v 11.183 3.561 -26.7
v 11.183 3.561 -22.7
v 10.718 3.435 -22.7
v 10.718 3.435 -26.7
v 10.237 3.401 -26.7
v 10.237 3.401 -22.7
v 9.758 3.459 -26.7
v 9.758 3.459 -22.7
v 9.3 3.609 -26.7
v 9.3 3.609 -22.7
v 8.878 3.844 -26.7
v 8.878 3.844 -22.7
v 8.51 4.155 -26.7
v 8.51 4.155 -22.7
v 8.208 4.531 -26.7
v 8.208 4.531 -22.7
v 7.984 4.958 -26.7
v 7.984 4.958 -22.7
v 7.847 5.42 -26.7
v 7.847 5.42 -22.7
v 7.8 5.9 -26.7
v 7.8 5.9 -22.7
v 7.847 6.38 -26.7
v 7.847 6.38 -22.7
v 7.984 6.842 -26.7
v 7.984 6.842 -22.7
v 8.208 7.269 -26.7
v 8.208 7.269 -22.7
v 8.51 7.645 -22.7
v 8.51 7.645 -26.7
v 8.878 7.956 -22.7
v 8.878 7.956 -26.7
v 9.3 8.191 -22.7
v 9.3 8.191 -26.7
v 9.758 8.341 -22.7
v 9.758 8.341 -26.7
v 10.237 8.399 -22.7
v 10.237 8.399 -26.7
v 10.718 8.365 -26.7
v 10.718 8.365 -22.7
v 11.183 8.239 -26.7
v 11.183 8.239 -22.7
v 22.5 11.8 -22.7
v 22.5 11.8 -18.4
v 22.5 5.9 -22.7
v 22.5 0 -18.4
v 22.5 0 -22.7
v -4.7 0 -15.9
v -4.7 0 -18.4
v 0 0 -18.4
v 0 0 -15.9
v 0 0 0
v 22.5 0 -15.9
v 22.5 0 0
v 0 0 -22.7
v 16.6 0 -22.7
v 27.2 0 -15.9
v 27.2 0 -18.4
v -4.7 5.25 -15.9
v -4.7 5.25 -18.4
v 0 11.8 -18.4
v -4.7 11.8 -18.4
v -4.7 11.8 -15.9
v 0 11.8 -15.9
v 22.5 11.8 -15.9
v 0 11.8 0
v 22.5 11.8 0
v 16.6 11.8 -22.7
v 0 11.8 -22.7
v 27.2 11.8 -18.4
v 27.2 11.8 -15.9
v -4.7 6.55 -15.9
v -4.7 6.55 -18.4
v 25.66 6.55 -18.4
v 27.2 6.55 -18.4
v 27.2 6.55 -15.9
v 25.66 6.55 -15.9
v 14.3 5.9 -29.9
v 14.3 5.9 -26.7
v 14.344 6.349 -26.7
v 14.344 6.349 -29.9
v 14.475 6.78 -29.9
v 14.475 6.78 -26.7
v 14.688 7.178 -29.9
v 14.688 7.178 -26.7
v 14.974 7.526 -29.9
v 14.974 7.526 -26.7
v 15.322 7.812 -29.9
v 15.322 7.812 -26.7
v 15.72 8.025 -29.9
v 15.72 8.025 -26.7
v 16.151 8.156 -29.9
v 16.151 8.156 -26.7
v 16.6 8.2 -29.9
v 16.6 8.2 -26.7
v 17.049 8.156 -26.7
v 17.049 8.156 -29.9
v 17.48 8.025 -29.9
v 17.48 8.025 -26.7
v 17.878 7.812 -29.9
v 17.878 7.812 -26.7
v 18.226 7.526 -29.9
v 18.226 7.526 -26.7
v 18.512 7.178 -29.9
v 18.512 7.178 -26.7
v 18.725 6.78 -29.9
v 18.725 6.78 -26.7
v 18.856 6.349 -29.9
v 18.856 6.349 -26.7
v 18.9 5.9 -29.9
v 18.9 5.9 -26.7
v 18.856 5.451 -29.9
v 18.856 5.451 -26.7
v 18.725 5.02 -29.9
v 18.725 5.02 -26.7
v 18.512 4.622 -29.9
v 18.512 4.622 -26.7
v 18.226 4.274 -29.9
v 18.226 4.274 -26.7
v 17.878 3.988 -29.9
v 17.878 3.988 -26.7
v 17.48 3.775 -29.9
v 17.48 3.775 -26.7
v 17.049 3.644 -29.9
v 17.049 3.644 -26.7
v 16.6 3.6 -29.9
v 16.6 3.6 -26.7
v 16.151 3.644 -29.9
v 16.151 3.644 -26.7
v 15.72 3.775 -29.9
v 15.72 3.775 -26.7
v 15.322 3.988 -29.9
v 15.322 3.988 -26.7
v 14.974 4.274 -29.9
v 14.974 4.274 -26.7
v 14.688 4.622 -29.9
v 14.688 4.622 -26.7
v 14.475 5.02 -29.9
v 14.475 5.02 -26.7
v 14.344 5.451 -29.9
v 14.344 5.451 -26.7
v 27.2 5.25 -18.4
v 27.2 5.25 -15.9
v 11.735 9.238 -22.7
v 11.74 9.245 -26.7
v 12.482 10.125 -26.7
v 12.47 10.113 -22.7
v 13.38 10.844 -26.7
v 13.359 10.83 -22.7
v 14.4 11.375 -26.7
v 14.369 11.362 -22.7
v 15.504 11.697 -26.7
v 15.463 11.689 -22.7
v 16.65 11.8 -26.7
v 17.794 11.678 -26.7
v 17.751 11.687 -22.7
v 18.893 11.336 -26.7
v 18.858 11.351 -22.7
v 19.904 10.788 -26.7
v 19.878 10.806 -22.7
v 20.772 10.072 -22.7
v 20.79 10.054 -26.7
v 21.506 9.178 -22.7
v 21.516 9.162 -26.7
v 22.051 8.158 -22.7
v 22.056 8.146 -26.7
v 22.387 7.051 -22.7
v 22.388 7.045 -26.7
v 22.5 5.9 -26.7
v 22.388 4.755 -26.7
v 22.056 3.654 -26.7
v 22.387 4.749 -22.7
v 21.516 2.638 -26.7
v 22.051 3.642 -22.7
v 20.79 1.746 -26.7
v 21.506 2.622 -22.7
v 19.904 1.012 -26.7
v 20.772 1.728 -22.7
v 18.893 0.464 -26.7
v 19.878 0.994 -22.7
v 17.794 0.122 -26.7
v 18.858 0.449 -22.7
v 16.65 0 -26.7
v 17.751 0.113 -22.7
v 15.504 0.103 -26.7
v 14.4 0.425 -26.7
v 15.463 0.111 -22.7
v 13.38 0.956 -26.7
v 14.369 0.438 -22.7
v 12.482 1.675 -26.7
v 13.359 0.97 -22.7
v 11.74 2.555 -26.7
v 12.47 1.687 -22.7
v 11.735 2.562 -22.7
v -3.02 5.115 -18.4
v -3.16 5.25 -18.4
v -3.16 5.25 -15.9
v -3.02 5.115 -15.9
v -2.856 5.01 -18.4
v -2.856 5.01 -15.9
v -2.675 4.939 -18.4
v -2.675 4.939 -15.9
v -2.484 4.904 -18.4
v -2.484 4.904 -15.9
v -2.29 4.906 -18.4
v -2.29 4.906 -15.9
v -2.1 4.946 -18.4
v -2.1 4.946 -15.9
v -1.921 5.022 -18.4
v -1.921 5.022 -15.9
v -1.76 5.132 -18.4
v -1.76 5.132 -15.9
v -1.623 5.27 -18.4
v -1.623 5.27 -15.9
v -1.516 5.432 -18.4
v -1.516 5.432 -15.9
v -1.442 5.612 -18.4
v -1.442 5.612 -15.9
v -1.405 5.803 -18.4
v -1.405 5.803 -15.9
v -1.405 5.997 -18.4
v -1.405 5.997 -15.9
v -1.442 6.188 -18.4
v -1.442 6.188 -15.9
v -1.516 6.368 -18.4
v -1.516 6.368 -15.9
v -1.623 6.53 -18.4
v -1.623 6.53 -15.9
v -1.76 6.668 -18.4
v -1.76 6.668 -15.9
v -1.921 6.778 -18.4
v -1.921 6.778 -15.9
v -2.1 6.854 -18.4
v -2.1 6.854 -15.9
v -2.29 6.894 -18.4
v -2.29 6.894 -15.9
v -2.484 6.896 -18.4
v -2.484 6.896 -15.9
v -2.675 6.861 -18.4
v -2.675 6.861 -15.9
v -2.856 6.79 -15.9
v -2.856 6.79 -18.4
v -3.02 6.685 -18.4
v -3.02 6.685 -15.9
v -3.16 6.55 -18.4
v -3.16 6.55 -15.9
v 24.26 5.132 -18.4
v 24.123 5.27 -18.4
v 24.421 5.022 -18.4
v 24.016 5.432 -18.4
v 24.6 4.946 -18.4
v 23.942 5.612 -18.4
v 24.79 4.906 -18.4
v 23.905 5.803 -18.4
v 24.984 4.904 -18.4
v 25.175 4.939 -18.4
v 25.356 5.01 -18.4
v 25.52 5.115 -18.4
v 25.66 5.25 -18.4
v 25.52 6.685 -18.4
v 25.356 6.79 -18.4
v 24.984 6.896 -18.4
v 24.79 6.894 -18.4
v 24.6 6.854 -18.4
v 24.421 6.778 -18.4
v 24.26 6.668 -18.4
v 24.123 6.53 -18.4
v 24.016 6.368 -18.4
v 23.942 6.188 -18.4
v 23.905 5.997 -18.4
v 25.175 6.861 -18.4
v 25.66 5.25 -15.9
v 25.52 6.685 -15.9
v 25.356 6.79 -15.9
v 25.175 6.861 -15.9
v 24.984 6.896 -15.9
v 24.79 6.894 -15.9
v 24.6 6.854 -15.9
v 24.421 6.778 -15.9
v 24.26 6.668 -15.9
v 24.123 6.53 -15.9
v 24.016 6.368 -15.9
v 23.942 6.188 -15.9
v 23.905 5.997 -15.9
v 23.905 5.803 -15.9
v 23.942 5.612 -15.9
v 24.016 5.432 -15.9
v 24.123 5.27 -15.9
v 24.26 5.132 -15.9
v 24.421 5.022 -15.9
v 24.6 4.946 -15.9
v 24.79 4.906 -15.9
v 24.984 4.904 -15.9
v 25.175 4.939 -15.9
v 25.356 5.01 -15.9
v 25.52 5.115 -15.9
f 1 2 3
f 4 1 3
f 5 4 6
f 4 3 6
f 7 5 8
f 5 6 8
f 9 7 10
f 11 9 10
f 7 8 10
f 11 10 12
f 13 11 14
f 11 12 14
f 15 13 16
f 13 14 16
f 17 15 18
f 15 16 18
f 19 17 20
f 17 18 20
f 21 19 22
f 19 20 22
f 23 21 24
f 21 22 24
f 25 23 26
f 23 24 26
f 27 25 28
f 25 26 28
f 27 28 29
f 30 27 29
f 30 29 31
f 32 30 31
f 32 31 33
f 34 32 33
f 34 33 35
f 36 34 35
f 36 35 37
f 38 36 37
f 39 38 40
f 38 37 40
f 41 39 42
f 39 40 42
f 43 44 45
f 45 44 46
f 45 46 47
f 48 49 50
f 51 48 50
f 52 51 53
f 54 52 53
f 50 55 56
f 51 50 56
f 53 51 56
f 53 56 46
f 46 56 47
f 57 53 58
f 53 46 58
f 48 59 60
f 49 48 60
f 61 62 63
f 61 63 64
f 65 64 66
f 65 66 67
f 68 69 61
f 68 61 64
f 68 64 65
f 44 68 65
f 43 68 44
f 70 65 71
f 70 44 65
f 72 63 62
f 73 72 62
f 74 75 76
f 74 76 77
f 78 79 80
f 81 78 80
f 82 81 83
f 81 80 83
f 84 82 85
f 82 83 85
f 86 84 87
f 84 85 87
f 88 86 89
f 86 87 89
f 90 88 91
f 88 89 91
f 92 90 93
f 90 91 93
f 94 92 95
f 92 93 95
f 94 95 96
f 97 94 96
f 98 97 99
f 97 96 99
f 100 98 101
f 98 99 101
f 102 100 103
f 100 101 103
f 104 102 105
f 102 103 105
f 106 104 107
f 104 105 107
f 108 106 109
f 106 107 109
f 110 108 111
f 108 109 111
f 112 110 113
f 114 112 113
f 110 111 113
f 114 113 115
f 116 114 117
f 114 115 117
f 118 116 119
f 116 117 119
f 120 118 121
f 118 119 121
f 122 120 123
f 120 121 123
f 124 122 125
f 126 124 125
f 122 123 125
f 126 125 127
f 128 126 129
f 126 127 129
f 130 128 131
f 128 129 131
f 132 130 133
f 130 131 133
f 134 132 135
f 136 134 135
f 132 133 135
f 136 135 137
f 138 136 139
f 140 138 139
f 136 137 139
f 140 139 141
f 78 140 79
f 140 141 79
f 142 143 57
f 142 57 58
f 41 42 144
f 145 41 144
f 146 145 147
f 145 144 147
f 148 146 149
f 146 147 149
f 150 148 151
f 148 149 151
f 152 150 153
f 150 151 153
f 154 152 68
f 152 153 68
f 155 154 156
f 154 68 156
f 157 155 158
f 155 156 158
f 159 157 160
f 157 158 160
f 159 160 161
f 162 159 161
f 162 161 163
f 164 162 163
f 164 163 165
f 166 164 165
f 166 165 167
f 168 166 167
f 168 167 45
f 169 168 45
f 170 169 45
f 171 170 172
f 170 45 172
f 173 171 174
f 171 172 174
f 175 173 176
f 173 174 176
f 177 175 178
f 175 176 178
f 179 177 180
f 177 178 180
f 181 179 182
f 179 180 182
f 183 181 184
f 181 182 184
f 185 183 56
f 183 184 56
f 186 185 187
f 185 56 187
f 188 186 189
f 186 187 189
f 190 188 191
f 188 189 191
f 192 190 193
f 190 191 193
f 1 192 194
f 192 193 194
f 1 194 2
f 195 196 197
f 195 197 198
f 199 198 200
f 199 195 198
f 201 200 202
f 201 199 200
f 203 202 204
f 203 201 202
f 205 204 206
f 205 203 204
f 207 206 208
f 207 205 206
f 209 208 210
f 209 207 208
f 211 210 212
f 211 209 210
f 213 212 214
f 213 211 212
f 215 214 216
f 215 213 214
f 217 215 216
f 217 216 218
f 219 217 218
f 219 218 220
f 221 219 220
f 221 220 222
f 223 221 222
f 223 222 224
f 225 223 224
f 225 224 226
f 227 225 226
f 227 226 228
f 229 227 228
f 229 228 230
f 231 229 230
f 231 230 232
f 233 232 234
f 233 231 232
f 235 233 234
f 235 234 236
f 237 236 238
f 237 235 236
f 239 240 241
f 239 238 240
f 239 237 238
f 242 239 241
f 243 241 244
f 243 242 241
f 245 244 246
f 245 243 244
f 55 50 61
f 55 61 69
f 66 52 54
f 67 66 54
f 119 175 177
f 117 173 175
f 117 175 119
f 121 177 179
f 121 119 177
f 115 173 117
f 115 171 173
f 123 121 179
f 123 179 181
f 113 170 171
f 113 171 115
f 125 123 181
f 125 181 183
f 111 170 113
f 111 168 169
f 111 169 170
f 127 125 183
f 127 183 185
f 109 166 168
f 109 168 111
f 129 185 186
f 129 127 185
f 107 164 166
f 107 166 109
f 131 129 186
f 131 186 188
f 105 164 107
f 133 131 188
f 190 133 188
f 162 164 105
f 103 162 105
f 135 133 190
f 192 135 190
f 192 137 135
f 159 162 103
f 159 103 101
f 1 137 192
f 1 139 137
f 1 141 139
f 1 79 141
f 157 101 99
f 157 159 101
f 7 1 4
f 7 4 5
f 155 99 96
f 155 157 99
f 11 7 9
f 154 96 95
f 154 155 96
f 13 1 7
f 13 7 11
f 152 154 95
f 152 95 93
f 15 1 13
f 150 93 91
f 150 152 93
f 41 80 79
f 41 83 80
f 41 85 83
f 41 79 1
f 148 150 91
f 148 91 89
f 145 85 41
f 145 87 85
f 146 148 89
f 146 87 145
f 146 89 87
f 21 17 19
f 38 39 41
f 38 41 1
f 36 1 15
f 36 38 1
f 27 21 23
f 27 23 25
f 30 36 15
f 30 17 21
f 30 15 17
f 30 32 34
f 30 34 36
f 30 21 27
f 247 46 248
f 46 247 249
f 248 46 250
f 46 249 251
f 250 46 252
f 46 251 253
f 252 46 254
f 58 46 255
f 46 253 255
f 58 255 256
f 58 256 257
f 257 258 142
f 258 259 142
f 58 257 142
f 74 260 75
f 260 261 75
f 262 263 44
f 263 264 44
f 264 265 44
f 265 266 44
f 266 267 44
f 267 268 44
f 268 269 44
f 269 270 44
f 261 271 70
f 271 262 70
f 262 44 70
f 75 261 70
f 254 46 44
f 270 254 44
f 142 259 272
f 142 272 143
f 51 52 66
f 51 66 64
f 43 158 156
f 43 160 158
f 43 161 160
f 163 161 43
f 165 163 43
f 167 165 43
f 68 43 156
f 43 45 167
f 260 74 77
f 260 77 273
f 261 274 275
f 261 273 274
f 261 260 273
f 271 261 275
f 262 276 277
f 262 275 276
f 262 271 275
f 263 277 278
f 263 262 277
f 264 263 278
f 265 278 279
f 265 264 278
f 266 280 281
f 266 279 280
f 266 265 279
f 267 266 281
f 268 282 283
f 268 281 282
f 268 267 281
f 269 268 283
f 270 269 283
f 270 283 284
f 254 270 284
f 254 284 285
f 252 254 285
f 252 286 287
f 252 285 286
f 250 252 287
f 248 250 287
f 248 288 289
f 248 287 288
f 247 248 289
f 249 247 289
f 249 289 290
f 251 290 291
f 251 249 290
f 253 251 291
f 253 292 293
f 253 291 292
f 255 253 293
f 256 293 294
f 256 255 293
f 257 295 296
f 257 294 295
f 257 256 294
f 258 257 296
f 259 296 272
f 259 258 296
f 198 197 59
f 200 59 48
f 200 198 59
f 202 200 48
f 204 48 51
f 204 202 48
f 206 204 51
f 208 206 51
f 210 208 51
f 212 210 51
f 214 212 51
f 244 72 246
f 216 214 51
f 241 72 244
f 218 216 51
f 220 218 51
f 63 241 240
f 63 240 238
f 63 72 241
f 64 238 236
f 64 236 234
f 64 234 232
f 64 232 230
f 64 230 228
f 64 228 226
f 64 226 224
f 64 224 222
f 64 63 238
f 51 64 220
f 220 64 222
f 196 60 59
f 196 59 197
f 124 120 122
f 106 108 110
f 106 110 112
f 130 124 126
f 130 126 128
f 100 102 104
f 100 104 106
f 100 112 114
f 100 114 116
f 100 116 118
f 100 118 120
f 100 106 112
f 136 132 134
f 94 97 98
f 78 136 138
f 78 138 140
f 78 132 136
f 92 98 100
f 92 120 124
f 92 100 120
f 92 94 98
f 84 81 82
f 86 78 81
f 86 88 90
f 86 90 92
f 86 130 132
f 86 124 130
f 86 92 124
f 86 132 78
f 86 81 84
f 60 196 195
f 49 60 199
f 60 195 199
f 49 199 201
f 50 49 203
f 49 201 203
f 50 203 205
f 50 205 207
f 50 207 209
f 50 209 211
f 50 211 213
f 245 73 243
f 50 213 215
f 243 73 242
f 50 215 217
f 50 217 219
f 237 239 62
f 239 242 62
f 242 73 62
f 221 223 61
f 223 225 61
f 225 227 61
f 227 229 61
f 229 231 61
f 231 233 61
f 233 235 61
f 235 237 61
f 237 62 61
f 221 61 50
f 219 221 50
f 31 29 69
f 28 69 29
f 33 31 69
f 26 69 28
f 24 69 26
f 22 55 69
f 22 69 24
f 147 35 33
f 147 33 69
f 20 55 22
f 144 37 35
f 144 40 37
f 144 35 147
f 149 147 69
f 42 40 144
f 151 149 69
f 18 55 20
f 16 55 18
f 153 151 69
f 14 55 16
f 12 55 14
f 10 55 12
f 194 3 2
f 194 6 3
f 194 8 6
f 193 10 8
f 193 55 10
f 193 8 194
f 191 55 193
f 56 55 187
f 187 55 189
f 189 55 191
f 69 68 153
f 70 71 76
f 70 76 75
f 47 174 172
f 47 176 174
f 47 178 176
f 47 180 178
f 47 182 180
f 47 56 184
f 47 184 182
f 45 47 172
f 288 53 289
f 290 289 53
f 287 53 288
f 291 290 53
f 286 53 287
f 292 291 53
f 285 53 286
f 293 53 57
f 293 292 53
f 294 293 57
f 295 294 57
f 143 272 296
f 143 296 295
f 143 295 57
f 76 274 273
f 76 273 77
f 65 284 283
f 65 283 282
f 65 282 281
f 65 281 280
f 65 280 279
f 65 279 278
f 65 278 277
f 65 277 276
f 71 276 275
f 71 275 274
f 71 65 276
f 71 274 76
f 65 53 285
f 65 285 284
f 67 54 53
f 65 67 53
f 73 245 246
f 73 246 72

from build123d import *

# Parameters (mm, degrees)
SKETCH1_W           = 22.5
SKETCH1_H           = 22.7
BOSS_EXTRUDE1_DEPTH = 11.8
SKETCH2_W           = 31.9
SKETCH2_H           = 2.5
BOSS_EXTRUDE2_DEPTH = 11.8
BOSS_EXTRUDE3_DEPTH = 4
SKETCH4_R           = 2.3
BOSS_EXTRUDE4_DEPTH = 3.2
CUT_EXTRUDE1_DEPTH  = 3.2


with BuildPart() as part:
    # Sketch1 → Boss-Extrude1 (new body)
    with BuildSketch(Plane(origin=(0, 0, 0), x_dir=(1, 0, 0), z_dir=(0, 1, 0))):
        with Locations((11.25, 11.35)):
            Rectangle(SKETCH1_W, SKETCH1_H)
    extrude(amount=BOSS_EXTRUDE1_DEPTH)

    # Sketch2 → Boss-Extrude2 (add)
    with BuildSketch(Plane(origin=(0, 11.8, 0), x_dir=(1, 0, 0), z_dir=(0, 1, 0))):
        with Locations((11.25, 17.15)):
            Rectangle(SKETCH2_W, SKETCH2_H)
    extrude(amount=-BOSS_EXTRUDE2_DEPTH)

    # Sketch3 → Boss-Extrude3 (add)
    with BuildSketch(Plane(origin=(0, 0, -22.7), x_dir=(-1, 0, 0), z_dir=(0, 0, -1))):
        with BuildLine():
            ThreePointArc((-11.183333333, 8.238743727), (-22.5, 5.9), (-11.183333333, 3.561256273))
            ThreePointArc((-11.183333333, 3.561256273), (-7.8, 5.9), (-11.183333333, 8.238743727))
        make_face()
    extrude(amount=BOSS_EXTRUDE3_DEPTH)

    # Sketch4 → Boss-Extrude4 (add)
    with BuildSketch(Plane(origin=(0, 0, -26.7), x_dir=(-1, 0, 0), z_dir=(0, 0, -1))):
        with Locations((-16.6, 5.9)):
            Circle(SKETCH4_R)
    extrude(amount=BOSS_EXTRUDE4_DEPTH)

    # Sketch5 → Cut-Extrude1 (cut)
    with BuildSketch(Plane(origin=(0, 0, -18.4), x_dir=(-1, 0, 0), z_dir=(0, 0, -1))):
        with BuildLine():
            Line((-27.2, 5.25), (-27.2, 6.55))
            Line((-27.2, 6.55), (-25.659934208, 6.55))
            ThreePointArc((-25.659934208, 6.55), (-23.9, 5.9), (-25.659934208, 5.25))
            Line((-25.659934208, 5.25), (-27.2, 5.25))
        make_face()
        with BuildLine():
            Line((4.7, 5.25), (3.159934208, 5.25))
            ThreePointArc((3.159934208, 5.25), (1.4, 5.9), (3.159934208, 6.55))
            Line((3.159934208, 6.55), (4.7, 6.55))
            Line((4.7, 6.55), (4.7, 5.25))
        make_face()
    extrude(amount=-CUT_EXTRUDE1_DEPTH, mode=Mode.SUBTRACT)


solid = part.part
